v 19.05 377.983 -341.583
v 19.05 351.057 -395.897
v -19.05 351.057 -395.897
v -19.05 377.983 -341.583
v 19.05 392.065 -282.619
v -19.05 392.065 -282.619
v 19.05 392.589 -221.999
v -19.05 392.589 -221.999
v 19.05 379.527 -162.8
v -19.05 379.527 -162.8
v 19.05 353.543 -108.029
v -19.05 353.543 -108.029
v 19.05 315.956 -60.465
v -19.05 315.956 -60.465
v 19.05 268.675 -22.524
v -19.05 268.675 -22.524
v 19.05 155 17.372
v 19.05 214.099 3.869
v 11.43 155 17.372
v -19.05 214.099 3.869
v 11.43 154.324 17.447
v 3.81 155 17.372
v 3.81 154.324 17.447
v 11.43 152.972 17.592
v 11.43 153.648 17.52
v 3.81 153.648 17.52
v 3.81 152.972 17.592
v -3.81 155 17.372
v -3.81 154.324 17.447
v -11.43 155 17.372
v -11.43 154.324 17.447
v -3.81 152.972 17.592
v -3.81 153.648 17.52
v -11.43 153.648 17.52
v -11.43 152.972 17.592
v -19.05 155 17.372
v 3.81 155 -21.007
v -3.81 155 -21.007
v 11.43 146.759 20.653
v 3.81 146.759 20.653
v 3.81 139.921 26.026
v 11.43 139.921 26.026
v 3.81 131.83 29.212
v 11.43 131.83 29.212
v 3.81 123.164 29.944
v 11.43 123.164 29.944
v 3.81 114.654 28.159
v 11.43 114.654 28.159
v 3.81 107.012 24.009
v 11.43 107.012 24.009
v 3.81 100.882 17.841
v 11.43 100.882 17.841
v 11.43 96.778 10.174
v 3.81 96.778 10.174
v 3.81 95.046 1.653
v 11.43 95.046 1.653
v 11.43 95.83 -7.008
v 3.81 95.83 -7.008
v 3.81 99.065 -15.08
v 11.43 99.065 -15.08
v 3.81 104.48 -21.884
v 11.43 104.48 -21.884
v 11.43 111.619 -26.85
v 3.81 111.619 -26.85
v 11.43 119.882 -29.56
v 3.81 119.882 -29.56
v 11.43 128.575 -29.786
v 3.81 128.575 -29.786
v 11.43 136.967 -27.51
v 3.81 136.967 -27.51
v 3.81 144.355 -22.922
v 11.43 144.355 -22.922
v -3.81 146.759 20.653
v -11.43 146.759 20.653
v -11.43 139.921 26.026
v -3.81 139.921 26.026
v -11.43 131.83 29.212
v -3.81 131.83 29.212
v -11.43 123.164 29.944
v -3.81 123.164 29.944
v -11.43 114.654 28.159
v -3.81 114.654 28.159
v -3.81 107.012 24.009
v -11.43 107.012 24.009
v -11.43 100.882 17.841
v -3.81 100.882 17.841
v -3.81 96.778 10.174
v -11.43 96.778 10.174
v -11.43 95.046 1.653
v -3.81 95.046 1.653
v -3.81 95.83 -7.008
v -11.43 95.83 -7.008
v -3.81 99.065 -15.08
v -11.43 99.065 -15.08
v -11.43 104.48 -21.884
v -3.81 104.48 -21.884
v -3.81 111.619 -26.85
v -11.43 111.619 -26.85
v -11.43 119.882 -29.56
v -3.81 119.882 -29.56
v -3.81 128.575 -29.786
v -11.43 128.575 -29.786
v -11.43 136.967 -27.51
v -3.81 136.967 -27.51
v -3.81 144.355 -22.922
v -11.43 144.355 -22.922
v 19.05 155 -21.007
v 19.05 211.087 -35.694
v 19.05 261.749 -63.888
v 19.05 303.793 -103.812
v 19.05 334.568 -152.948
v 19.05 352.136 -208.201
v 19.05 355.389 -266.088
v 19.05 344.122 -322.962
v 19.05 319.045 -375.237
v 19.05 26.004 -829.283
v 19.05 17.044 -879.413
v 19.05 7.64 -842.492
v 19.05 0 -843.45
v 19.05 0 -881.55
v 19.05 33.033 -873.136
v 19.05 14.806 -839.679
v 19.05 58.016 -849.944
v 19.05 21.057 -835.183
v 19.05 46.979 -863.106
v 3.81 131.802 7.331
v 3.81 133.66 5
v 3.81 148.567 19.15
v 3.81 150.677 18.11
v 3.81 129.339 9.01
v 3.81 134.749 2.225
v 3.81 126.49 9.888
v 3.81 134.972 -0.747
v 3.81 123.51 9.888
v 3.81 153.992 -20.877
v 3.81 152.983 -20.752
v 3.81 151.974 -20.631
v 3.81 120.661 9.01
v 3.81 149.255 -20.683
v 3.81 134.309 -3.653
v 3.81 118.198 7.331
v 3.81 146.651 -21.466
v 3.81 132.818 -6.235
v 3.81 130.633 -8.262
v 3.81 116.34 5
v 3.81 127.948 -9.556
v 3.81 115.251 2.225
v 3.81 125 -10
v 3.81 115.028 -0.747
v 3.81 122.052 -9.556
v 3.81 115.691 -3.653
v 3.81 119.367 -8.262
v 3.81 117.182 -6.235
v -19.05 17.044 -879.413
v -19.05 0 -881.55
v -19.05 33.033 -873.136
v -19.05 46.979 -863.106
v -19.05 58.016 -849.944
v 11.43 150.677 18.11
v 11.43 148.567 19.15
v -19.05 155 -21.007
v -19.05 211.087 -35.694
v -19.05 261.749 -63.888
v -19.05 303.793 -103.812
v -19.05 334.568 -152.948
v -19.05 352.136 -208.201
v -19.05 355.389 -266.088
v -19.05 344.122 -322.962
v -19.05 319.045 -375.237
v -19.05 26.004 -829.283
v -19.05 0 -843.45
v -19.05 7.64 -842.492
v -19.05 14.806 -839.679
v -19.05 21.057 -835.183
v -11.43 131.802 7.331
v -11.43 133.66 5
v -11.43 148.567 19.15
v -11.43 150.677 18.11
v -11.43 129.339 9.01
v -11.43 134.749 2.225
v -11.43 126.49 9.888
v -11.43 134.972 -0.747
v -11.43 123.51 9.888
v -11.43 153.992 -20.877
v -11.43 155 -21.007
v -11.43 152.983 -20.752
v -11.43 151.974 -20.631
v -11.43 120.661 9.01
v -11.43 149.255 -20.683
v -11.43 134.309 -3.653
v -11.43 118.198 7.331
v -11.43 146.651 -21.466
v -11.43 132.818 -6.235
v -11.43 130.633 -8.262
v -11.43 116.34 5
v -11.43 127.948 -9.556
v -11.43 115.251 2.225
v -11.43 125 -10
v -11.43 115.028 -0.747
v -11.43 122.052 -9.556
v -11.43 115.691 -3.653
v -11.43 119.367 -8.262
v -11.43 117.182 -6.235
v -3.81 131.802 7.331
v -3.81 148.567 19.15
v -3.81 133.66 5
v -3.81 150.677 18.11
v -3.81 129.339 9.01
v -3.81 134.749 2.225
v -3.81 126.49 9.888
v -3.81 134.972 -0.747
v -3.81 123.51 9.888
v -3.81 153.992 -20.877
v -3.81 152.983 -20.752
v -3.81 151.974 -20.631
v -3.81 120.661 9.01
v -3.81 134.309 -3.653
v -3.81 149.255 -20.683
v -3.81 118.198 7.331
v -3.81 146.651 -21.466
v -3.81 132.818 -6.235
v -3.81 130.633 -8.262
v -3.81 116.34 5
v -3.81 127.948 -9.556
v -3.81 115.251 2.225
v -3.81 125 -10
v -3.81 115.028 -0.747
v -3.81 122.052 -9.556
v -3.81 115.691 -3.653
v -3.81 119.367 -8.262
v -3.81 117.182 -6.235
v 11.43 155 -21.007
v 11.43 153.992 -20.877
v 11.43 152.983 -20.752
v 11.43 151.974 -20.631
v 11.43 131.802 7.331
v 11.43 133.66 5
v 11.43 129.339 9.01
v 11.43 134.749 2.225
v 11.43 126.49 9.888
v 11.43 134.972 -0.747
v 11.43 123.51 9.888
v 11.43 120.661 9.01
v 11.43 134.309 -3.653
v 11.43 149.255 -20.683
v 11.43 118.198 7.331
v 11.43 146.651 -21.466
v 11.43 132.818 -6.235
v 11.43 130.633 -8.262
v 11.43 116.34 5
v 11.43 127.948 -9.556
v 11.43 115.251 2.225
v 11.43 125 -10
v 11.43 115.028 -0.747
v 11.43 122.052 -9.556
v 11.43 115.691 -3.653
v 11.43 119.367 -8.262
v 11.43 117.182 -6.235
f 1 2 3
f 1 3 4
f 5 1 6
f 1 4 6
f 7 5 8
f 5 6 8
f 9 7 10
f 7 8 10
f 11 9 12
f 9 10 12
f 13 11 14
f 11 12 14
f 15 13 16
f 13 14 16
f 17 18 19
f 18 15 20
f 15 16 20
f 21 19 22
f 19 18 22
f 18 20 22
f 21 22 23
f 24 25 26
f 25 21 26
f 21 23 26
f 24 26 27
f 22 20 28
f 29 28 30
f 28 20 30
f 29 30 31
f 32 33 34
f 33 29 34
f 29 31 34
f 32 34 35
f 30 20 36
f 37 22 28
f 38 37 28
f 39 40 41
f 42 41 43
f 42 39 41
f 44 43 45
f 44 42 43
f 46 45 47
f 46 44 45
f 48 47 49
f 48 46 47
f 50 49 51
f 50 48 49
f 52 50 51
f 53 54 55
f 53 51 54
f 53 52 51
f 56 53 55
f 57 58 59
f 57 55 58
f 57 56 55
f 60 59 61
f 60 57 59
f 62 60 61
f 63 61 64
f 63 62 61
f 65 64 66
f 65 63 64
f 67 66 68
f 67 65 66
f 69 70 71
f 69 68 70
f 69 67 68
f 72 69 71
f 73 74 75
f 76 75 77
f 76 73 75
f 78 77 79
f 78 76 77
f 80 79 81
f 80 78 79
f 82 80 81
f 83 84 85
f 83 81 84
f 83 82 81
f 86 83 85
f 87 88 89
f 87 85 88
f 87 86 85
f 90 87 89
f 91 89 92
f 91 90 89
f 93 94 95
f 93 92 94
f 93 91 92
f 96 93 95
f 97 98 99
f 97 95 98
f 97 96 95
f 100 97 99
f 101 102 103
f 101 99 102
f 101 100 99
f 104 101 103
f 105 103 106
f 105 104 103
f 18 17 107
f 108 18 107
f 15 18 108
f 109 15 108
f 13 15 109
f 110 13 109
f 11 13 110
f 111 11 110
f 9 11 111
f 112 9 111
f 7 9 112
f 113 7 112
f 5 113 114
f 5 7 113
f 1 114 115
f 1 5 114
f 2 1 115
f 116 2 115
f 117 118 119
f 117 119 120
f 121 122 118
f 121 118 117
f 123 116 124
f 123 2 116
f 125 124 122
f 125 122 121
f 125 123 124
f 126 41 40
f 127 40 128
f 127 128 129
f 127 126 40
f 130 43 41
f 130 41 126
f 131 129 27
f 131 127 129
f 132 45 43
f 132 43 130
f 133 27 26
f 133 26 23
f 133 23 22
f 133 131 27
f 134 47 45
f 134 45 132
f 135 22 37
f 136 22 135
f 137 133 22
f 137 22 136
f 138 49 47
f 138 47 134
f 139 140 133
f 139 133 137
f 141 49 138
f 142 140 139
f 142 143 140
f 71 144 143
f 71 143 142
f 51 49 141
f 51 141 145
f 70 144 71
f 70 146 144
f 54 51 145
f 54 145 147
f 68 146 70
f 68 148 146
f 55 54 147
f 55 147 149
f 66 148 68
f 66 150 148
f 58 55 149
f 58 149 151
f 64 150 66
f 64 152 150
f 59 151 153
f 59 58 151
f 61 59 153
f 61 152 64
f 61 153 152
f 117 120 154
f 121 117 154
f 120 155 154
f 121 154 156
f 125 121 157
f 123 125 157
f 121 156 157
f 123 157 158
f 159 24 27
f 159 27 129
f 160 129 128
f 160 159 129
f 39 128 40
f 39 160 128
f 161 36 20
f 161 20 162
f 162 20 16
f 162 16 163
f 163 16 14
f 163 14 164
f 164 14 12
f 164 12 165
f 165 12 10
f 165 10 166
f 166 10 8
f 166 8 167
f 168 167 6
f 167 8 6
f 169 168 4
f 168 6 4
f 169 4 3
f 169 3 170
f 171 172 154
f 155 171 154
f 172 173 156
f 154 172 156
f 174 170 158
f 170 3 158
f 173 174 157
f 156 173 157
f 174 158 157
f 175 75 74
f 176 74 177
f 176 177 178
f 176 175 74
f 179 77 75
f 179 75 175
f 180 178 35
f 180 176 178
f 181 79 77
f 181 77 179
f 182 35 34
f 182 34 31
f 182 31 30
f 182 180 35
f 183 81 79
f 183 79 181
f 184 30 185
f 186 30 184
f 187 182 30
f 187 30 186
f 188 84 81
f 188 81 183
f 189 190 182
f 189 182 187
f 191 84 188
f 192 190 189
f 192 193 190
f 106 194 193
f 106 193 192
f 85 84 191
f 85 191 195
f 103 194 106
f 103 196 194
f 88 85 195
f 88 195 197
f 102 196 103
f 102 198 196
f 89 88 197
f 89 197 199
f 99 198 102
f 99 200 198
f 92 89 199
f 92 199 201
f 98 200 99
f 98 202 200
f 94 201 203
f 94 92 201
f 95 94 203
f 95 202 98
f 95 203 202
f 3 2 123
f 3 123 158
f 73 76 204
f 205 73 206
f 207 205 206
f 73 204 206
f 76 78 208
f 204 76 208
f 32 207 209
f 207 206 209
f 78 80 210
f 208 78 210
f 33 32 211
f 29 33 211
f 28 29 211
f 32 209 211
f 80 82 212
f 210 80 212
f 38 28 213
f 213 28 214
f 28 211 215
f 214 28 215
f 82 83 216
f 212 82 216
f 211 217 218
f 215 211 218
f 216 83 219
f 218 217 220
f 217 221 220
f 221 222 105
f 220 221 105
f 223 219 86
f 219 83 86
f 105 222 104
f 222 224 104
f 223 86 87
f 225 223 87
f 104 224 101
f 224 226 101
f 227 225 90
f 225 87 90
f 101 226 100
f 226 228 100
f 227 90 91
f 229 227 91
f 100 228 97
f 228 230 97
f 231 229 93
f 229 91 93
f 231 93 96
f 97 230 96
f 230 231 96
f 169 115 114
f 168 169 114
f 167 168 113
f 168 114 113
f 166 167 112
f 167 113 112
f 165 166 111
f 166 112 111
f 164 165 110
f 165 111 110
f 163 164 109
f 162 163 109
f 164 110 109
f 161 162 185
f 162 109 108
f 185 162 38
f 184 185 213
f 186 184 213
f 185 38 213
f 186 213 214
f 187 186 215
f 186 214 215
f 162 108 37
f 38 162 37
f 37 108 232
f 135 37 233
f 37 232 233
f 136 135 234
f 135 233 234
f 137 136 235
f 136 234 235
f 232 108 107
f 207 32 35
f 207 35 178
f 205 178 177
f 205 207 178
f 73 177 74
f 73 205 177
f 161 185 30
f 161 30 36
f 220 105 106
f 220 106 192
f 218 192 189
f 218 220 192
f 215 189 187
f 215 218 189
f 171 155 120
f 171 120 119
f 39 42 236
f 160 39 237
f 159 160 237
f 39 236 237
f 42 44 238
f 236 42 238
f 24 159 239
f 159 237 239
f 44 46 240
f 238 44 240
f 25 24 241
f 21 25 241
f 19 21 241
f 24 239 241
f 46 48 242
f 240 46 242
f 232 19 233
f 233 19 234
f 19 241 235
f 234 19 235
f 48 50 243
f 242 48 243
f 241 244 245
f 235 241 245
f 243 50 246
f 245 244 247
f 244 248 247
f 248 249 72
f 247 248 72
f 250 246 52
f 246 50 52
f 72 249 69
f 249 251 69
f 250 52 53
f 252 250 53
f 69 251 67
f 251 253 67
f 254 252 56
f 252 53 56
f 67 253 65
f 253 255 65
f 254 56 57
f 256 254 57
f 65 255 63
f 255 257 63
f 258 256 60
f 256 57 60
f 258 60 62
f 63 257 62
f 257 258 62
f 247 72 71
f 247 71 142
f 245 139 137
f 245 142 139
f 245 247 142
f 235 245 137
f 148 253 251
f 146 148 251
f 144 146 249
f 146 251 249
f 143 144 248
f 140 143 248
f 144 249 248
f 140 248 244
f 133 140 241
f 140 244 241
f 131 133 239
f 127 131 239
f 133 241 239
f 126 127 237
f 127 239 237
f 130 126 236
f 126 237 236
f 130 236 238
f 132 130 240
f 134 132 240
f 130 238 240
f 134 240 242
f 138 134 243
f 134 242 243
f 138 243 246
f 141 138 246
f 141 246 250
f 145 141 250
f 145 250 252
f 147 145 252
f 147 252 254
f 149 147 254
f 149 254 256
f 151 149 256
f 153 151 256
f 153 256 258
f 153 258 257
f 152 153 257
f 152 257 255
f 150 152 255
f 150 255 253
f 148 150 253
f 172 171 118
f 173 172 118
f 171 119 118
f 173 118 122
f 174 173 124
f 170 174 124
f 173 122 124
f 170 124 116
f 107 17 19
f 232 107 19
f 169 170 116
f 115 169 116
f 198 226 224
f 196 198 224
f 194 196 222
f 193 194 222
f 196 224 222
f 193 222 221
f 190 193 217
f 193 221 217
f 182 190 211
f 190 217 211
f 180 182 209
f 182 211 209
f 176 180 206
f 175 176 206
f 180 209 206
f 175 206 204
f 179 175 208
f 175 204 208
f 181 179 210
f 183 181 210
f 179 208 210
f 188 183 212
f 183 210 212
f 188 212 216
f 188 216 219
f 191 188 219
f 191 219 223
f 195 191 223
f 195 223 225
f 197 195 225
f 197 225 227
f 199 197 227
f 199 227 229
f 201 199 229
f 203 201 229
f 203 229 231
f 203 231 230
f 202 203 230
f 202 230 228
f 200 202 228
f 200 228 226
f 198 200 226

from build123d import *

# Parameters (mm, degrees)
SKETCH3_W           = 38.1
SKETCH3_H           = 38.1
BOSS_EXTRUDE2_DEPTH = 38.1
SKETCH5_R           = 10
CUT_EXTRUDE1_DEPTH  = 967.362983045
SKETCH7_W           = 7.62
SKETCH7_H           = 116.34084036
CUT_EXTRUDE2_DEPTH  = 60


with BuildPart() as part:
    # Sweep1: sweep along a path in Sketch2
    with BuildLine(Plane(origin=(0, 0, 0), x_dir=(0, 0, -1), z_dir=(1, 0, 0))) as sweep1_path:
        ThreePointArc((862.5, 0), (856.407116711, 23.91997287), (839.613395916, 42.010281621))
        Line((839.613395916, 42.010281621), (385.566979579, 335.051408107))
        ThreePointArc((385.566979579, 335.051408107), (130.40013565, 344.535583556), (0, 125))
    # Sketch3 → Sweep1 (sweep)
    with BuildSketch(Plane(origin=(0, 0, 0), x_dir=(1, 0, 0), z_dir=(0, 1, 0))):
        with Locations((0, 862.5)):
            Rectangle(SKETCH3_W, SKETCH3_H)
    sweep(path=sweep1_path.line)

    # Sketch4 → Boss-Extrude2 (add)
    with BuildSketch(Plane(origin=(19.05, 0, 0), x_dir=(0, 0, -1), z_dir=(1, 0, 0))):
        with BuildLine():
            ThreePointArc((22.92164625, 144.354537793), (20.985722139, 147.926611635), (20.630635597, 151.974009223))
            ThreePointArc((20.630635597, 151.974009223), (19.44549754, 138.510140473), (19.05, 125))
            Line((19.05, 125), (10, 125))
            ThreePointArc((10, 125), (0, 115), (-10, 125))
            Line((-10, 125), (-19.05, 125))
            ThreePointArc((-19.05, 125), (-18.685251714, 139.004928115), (-17.591995826, 152.971883559))
            ThreePointArc((-17.591995826, 152.971883559), (-18.567549982, 149.591749406), (-20.65335375, 146.758652966))
            ThreePointArc((-20.65335375, 146.758652966), (-1.652643385, 95.04555509), (22.92164625, 144.354537793))
        make_face()
    extrude(amount=-BOSS_EXTRUDE2_DEPTH)

    # Sketch5 → Cut-Extrude1 (cut, through all)
    with BuildSketch(Plane(origin=(19.05, 0, 0), x_dir=(0, 0, -1), z_dir=(1, 0, 0))):
        with Locations((0, 125)):
            Circle(SKETCH5_R)
    extrude(amount=-CUT_EXTRUDE1_DEPTH, mode=Mode.SUBTRACT)

    # Sketch7 → Cut-Extrude2 (cut)
    with BuildSketch(Plane(origin=(0, 95, 0), x_dir=(-1, 0, 0), z_dir=(0, -1, 0))):
        with Locations((-15.24, -0.743263463)):
            Rectangle(SKETCH7_W, SKETCH7_H)
        with Locations((0, -0.743263463)):
            Rectangle(SKETCH7_W, SKETCH7_H)
        with Locations((15.24, -0.743263463)):
            Rectangle(SKETCH7_W, SKETCH7_H)
    extrude(amount=-CUT_EXTRUDE2_DEPTH, mode=Mode.SUBTRACT)


solid = part.part
